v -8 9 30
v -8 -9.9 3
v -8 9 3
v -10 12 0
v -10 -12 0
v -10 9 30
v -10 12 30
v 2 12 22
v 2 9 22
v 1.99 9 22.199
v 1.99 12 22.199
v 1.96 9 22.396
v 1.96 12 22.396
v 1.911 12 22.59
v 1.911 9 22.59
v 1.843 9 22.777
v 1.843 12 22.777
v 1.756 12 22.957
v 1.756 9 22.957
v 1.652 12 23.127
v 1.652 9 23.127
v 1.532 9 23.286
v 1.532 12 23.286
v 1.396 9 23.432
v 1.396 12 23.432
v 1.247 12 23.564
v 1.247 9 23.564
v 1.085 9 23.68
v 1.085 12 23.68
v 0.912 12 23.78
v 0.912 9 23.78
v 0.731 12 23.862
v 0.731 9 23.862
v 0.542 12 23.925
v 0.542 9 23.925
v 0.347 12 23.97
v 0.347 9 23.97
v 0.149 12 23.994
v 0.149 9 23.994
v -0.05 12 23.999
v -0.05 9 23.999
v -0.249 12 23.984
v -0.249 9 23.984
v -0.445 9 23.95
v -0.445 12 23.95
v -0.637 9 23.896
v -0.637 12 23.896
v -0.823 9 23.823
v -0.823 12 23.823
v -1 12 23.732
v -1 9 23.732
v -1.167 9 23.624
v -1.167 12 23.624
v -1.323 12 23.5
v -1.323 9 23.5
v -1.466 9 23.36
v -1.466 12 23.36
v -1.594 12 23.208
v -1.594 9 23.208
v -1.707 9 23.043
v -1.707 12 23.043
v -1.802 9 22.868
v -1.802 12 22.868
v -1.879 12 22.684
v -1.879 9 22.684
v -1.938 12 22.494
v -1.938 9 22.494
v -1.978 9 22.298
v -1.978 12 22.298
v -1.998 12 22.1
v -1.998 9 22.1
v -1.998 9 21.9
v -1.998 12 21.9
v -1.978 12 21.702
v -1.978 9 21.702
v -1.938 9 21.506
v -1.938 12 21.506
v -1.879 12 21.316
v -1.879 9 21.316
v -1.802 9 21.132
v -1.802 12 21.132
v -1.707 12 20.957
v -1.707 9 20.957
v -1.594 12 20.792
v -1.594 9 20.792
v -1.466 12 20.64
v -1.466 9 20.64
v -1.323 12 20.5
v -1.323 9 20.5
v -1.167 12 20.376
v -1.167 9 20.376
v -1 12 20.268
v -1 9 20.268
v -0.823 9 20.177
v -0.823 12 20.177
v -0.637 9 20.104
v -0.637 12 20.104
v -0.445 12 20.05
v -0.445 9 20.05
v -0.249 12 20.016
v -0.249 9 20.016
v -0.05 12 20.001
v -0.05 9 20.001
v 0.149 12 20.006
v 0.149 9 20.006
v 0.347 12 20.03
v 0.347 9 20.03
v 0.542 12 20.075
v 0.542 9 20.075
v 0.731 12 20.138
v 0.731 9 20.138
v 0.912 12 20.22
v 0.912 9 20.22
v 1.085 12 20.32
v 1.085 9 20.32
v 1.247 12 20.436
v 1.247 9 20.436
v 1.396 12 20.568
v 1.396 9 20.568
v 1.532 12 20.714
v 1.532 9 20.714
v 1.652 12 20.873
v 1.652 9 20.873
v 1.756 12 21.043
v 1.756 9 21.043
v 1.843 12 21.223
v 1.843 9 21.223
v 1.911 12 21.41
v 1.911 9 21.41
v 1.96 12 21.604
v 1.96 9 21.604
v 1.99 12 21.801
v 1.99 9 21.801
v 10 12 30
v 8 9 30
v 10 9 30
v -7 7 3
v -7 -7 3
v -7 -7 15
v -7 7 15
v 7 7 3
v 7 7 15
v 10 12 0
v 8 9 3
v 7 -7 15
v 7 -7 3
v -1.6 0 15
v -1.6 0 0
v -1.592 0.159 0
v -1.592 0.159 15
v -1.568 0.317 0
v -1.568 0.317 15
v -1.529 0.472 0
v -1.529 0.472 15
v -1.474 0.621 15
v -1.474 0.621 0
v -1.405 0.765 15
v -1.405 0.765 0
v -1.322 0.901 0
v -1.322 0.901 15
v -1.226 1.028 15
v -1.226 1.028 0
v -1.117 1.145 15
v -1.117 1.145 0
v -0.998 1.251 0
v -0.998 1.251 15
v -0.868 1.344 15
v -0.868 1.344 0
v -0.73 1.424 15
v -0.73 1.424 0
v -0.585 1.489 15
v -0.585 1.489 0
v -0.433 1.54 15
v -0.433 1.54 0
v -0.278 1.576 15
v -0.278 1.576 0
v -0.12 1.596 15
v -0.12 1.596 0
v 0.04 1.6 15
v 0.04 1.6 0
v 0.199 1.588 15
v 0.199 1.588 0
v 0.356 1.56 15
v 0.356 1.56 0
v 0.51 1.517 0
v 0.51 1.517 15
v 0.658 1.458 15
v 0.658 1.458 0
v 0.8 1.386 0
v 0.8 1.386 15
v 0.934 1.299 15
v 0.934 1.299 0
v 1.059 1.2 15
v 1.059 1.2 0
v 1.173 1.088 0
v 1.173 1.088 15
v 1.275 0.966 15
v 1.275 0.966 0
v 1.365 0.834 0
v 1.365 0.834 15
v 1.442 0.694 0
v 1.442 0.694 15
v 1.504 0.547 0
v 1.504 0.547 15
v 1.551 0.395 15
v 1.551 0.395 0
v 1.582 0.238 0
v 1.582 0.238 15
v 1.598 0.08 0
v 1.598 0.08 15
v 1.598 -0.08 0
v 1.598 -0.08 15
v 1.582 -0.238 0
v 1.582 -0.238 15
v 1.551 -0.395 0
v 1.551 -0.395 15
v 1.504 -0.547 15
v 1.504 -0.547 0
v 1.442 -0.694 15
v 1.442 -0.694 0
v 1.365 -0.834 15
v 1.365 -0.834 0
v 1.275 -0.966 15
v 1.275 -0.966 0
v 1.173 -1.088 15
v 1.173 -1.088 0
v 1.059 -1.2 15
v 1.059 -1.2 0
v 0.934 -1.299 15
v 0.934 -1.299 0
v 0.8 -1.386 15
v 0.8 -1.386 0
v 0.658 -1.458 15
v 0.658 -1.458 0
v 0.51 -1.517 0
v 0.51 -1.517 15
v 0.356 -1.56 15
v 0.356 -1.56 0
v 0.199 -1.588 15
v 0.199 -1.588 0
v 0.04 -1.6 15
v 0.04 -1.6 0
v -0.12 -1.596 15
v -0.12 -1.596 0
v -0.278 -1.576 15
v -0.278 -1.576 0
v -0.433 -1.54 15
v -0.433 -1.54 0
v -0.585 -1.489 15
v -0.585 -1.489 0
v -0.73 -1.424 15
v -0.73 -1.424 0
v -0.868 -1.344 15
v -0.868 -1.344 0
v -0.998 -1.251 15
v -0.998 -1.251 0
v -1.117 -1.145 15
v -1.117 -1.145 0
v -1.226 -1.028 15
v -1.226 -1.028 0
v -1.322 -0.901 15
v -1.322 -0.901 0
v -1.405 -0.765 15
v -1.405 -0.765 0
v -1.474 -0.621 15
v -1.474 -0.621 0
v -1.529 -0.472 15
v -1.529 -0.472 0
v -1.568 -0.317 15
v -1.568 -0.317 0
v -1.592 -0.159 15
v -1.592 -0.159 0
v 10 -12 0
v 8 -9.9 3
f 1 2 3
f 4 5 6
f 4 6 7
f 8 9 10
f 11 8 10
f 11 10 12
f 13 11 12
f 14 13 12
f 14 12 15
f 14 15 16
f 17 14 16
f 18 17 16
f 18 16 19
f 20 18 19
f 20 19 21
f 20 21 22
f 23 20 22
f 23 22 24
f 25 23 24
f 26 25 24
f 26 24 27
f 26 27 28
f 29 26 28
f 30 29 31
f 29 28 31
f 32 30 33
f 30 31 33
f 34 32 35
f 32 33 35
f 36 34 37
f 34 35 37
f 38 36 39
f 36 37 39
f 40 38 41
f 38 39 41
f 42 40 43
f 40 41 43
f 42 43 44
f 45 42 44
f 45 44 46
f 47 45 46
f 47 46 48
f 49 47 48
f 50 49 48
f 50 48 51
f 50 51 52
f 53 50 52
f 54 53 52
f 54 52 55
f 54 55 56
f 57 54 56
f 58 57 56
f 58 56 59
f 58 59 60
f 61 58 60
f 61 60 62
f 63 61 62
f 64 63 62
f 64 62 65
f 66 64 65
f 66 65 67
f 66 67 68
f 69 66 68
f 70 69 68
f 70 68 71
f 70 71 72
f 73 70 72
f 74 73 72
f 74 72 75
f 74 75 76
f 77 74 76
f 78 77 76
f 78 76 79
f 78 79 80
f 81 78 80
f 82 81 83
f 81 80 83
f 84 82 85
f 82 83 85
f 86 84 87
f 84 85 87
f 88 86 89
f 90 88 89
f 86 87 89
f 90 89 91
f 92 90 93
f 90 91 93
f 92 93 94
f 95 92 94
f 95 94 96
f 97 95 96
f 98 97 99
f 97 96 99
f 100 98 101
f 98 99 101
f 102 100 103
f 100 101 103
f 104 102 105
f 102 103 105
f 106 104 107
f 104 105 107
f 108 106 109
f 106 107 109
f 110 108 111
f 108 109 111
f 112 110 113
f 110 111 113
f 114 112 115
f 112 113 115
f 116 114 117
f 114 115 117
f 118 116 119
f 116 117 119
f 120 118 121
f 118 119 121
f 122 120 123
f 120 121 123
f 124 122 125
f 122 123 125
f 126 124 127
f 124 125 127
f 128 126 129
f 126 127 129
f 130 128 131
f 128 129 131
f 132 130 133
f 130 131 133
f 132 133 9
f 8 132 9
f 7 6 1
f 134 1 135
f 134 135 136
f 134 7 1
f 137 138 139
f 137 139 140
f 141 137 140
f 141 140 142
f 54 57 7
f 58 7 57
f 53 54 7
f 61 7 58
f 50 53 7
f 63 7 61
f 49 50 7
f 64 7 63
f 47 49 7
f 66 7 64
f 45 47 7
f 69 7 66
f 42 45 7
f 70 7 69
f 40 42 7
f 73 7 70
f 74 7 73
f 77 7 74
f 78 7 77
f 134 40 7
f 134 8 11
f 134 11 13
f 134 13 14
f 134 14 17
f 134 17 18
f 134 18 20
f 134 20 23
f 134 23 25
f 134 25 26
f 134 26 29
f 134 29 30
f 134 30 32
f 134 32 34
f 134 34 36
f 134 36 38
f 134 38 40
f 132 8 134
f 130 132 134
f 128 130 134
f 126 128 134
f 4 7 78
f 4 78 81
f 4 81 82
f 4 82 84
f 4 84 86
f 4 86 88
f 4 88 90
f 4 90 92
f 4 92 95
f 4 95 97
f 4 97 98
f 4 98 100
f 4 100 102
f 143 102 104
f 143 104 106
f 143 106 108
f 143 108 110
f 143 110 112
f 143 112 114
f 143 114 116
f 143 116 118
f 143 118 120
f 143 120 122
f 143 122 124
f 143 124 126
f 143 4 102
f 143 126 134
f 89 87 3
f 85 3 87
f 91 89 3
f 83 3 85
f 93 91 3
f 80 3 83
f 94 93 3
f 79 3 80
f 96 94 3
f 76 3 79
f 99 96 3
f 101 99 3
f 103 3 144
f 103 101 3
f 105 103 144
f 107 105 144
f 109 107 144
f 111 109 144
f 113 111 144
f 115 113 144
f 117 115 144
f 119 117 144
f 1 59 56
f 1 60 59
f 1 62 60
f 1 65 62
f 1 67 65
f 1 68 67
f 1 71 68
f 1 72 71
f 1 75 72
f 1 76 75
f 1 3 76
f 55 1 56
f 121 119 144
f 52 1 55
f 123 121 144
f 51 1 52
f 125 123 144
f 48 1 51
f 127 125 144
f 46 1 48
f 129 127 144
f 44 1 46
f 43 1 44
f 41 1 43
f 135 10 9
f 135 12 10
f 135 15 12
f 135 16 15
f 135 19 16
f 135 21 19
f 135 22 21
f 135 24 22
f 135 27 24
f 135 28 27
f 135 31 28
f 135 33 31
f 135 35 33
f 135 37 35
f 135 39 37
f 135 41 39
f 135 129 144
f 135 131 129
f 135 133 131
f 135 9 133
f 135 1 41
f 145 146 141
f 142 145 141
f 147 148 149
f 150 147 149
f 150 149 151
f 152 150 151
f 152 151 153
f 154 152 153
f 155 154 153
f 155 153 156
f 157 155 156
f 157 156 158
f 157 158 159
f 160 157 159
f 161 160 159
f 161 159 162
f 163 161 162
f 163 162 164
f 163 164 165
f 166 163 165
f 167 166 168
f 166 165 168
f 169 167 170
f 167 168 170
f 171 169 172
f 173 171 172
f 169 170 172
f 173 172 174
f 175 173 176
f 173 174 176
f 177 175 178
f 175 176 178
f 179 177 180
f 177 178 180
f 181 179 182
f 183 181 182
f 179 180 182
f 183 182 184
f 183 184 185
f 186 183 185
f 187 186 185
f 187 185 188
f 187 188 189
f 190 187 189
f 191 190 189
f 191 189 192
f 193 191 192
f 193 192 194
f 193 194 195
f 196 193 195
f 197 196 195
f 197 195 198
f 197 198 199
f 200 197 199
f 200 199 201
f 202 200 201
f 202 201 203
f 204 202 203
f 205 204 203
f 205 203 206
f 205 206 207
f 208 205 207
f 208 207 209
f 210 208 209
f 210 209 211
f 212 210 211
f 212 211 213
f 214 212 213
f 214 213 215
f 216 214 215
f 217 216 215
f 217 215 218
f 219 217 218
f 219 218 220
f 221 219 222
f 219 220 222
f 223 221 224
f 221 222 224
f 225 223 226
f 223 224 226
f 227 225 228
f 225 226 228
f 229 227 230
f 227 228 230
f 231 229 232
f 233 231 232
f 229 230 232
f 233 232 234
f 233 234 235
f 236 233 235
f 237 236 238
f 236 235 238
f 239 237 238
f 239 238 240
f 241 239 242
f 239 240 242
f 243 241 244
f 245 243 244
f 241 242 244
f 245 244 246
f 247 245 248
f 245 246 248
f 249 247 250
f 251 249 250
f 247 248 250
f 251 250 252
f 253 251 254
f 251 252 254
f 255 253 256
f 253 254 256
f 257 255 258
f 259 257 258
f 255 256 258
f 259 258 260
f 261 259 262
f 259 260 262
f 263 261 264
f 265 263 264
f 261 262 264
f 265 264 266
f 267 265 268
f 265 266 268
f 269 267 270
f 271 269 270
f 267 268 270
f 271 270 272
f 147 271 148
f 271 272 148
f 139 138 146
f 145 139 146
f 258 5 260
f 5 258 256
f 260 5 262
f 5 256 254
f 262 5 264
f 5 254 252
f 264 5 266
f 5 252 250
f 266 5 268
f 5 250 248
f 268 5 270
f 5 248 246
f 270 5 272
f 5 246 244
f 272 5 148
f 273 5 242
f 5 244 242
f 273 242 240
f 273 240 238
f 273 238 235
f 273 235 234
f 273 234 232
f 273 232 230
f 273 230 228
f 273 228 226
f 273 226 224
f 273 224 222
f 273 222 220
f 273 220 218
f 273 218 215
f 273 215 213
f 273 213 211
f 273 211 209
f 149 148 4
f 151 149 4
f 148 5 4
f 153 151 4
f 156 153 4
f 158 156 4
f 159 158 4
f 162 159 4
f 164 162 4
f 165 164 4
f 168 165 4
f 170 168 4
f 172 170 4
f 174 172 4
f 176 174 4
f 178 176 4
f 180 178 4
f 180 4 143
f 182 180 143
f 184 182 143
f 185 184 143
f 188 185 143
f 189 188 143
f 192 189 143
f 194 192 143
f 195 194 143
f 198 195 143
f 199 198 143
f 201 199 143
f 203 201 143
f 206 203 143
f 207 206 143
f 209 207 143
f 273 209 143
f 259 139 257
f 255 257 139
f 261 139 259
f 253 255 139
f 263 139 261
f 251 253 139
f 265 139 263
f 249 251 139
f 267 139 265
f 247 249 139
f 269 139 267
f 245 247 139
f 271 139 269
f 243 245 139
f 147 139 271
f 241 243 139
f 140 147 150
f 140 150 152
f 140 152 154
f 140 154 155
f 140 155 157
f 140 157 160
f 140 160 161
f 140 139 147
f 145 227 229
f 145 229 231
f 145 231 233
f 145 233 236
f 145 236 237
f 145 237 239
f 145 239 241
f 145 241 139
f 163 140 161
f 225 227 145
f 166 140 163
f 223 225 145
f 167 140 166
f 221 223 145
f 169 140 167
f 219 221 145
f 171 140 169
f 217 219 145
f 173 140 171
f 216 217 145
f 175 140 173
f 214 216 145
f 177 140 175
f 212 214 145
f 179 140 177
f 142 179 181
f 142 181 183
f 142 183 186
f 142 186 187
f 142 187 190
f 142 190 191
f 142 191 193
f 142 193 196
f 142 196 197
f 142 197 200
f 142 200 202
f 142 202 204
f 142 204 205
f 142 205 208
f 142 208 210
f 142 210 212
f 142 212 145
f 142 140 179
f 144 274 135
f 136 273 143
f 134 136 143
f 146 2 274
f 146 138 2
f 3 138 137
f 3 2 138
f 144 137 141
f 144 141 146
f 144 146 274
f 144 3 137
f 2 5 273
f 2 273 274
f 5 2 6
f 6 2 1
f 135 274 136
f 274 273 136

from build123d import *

# Parameters (mm, degrees)
SKETCH1_W           = 20
SKETCH1_H           = 24
BOSS_EXTRUDE1_DEPTH = 30
CUT_EXTRUDE1_DEPTH  = 21
SKETCH3_W           = 16
SKETCH3_H           = 19
CUT_EXTRUDE2_DEPTH  = 27
SKETCH4_W           = 14
SKETCH4_H           = 14
BOSS_EXTRUDE2_DEPTH = 12
SKETCH5_R           = 1.6
CUT_EXTRUDE3_DEPTH  = 31
SKETCH6_R           = 2
CUT_EXTRUDE4_DEPTH  = 4


with BuildPart() as part:
    # Sketch1 → Boss-Extrude1 (new body)
    with BuildSketch(Plane.XY):
        Rectangle(SKETCH1_W, SKETCH1_H)
    extrude(amount=BOSS_EXTRUDE1_DEPTH)

    # Sketch2 → Cut-Extrude1 (cut, through all)
    with BuildSketch(Plane(origin=(10, 0, 0), x_dir=(0, 0, -1), z_dir=(1, 0, 0))):
        Polygon((0, -12), (-30, 9), (-30, -12), align=None)
    extrude(amount=-CUT_EXTRUDE1_DEPTH, mode=Mode.SUBTRACT)

    # Sketch3 → Cut-Extrude2 (cut)
    with BuildSketch(Plane.XY.offset(30)):
        with Locations((0, -0.5)):
            Rectangle(SKETCH3_W, SKETCH3_H)
    extrude(amount=-CUT_EXTRUDE2_DEPTH, mode=Mode.SUBTRACT)

    # Sketch4 → Boss-Extrude2 (add)
    with BuildSketch(Plane.XY.offset(3)):
        Rectangle(SKETCH4_W, SKETCH4_H)
    extrude(amount=BOSS_EXTRUDE2_DEPTH)

    # Sketch5 → Cut-Extrude3 (cut, through all)
    with BuildSketch(Plane(origin=(0, 0, 0), x_dir=(-1, 0, 0), z_dir=(0, 0, -1))):
        Circle(SKETCH5_R)
    extrude(amount=-CUT_EXTRUDE3_DEPTH, mode=Mode.SUBTRACT)

    # Sketch6 → Cut-Extrude4 (cut, through all)
    with BuildSketch(Plane.XZ.offset(-9)):
        with Locations((0, 22)):
            Circle(SKETCH6_R)
    extrude(amount=-CUT_EXTRUDE4_DEPTH, mode=Mode.SUBTRACT)


solid = part.part
